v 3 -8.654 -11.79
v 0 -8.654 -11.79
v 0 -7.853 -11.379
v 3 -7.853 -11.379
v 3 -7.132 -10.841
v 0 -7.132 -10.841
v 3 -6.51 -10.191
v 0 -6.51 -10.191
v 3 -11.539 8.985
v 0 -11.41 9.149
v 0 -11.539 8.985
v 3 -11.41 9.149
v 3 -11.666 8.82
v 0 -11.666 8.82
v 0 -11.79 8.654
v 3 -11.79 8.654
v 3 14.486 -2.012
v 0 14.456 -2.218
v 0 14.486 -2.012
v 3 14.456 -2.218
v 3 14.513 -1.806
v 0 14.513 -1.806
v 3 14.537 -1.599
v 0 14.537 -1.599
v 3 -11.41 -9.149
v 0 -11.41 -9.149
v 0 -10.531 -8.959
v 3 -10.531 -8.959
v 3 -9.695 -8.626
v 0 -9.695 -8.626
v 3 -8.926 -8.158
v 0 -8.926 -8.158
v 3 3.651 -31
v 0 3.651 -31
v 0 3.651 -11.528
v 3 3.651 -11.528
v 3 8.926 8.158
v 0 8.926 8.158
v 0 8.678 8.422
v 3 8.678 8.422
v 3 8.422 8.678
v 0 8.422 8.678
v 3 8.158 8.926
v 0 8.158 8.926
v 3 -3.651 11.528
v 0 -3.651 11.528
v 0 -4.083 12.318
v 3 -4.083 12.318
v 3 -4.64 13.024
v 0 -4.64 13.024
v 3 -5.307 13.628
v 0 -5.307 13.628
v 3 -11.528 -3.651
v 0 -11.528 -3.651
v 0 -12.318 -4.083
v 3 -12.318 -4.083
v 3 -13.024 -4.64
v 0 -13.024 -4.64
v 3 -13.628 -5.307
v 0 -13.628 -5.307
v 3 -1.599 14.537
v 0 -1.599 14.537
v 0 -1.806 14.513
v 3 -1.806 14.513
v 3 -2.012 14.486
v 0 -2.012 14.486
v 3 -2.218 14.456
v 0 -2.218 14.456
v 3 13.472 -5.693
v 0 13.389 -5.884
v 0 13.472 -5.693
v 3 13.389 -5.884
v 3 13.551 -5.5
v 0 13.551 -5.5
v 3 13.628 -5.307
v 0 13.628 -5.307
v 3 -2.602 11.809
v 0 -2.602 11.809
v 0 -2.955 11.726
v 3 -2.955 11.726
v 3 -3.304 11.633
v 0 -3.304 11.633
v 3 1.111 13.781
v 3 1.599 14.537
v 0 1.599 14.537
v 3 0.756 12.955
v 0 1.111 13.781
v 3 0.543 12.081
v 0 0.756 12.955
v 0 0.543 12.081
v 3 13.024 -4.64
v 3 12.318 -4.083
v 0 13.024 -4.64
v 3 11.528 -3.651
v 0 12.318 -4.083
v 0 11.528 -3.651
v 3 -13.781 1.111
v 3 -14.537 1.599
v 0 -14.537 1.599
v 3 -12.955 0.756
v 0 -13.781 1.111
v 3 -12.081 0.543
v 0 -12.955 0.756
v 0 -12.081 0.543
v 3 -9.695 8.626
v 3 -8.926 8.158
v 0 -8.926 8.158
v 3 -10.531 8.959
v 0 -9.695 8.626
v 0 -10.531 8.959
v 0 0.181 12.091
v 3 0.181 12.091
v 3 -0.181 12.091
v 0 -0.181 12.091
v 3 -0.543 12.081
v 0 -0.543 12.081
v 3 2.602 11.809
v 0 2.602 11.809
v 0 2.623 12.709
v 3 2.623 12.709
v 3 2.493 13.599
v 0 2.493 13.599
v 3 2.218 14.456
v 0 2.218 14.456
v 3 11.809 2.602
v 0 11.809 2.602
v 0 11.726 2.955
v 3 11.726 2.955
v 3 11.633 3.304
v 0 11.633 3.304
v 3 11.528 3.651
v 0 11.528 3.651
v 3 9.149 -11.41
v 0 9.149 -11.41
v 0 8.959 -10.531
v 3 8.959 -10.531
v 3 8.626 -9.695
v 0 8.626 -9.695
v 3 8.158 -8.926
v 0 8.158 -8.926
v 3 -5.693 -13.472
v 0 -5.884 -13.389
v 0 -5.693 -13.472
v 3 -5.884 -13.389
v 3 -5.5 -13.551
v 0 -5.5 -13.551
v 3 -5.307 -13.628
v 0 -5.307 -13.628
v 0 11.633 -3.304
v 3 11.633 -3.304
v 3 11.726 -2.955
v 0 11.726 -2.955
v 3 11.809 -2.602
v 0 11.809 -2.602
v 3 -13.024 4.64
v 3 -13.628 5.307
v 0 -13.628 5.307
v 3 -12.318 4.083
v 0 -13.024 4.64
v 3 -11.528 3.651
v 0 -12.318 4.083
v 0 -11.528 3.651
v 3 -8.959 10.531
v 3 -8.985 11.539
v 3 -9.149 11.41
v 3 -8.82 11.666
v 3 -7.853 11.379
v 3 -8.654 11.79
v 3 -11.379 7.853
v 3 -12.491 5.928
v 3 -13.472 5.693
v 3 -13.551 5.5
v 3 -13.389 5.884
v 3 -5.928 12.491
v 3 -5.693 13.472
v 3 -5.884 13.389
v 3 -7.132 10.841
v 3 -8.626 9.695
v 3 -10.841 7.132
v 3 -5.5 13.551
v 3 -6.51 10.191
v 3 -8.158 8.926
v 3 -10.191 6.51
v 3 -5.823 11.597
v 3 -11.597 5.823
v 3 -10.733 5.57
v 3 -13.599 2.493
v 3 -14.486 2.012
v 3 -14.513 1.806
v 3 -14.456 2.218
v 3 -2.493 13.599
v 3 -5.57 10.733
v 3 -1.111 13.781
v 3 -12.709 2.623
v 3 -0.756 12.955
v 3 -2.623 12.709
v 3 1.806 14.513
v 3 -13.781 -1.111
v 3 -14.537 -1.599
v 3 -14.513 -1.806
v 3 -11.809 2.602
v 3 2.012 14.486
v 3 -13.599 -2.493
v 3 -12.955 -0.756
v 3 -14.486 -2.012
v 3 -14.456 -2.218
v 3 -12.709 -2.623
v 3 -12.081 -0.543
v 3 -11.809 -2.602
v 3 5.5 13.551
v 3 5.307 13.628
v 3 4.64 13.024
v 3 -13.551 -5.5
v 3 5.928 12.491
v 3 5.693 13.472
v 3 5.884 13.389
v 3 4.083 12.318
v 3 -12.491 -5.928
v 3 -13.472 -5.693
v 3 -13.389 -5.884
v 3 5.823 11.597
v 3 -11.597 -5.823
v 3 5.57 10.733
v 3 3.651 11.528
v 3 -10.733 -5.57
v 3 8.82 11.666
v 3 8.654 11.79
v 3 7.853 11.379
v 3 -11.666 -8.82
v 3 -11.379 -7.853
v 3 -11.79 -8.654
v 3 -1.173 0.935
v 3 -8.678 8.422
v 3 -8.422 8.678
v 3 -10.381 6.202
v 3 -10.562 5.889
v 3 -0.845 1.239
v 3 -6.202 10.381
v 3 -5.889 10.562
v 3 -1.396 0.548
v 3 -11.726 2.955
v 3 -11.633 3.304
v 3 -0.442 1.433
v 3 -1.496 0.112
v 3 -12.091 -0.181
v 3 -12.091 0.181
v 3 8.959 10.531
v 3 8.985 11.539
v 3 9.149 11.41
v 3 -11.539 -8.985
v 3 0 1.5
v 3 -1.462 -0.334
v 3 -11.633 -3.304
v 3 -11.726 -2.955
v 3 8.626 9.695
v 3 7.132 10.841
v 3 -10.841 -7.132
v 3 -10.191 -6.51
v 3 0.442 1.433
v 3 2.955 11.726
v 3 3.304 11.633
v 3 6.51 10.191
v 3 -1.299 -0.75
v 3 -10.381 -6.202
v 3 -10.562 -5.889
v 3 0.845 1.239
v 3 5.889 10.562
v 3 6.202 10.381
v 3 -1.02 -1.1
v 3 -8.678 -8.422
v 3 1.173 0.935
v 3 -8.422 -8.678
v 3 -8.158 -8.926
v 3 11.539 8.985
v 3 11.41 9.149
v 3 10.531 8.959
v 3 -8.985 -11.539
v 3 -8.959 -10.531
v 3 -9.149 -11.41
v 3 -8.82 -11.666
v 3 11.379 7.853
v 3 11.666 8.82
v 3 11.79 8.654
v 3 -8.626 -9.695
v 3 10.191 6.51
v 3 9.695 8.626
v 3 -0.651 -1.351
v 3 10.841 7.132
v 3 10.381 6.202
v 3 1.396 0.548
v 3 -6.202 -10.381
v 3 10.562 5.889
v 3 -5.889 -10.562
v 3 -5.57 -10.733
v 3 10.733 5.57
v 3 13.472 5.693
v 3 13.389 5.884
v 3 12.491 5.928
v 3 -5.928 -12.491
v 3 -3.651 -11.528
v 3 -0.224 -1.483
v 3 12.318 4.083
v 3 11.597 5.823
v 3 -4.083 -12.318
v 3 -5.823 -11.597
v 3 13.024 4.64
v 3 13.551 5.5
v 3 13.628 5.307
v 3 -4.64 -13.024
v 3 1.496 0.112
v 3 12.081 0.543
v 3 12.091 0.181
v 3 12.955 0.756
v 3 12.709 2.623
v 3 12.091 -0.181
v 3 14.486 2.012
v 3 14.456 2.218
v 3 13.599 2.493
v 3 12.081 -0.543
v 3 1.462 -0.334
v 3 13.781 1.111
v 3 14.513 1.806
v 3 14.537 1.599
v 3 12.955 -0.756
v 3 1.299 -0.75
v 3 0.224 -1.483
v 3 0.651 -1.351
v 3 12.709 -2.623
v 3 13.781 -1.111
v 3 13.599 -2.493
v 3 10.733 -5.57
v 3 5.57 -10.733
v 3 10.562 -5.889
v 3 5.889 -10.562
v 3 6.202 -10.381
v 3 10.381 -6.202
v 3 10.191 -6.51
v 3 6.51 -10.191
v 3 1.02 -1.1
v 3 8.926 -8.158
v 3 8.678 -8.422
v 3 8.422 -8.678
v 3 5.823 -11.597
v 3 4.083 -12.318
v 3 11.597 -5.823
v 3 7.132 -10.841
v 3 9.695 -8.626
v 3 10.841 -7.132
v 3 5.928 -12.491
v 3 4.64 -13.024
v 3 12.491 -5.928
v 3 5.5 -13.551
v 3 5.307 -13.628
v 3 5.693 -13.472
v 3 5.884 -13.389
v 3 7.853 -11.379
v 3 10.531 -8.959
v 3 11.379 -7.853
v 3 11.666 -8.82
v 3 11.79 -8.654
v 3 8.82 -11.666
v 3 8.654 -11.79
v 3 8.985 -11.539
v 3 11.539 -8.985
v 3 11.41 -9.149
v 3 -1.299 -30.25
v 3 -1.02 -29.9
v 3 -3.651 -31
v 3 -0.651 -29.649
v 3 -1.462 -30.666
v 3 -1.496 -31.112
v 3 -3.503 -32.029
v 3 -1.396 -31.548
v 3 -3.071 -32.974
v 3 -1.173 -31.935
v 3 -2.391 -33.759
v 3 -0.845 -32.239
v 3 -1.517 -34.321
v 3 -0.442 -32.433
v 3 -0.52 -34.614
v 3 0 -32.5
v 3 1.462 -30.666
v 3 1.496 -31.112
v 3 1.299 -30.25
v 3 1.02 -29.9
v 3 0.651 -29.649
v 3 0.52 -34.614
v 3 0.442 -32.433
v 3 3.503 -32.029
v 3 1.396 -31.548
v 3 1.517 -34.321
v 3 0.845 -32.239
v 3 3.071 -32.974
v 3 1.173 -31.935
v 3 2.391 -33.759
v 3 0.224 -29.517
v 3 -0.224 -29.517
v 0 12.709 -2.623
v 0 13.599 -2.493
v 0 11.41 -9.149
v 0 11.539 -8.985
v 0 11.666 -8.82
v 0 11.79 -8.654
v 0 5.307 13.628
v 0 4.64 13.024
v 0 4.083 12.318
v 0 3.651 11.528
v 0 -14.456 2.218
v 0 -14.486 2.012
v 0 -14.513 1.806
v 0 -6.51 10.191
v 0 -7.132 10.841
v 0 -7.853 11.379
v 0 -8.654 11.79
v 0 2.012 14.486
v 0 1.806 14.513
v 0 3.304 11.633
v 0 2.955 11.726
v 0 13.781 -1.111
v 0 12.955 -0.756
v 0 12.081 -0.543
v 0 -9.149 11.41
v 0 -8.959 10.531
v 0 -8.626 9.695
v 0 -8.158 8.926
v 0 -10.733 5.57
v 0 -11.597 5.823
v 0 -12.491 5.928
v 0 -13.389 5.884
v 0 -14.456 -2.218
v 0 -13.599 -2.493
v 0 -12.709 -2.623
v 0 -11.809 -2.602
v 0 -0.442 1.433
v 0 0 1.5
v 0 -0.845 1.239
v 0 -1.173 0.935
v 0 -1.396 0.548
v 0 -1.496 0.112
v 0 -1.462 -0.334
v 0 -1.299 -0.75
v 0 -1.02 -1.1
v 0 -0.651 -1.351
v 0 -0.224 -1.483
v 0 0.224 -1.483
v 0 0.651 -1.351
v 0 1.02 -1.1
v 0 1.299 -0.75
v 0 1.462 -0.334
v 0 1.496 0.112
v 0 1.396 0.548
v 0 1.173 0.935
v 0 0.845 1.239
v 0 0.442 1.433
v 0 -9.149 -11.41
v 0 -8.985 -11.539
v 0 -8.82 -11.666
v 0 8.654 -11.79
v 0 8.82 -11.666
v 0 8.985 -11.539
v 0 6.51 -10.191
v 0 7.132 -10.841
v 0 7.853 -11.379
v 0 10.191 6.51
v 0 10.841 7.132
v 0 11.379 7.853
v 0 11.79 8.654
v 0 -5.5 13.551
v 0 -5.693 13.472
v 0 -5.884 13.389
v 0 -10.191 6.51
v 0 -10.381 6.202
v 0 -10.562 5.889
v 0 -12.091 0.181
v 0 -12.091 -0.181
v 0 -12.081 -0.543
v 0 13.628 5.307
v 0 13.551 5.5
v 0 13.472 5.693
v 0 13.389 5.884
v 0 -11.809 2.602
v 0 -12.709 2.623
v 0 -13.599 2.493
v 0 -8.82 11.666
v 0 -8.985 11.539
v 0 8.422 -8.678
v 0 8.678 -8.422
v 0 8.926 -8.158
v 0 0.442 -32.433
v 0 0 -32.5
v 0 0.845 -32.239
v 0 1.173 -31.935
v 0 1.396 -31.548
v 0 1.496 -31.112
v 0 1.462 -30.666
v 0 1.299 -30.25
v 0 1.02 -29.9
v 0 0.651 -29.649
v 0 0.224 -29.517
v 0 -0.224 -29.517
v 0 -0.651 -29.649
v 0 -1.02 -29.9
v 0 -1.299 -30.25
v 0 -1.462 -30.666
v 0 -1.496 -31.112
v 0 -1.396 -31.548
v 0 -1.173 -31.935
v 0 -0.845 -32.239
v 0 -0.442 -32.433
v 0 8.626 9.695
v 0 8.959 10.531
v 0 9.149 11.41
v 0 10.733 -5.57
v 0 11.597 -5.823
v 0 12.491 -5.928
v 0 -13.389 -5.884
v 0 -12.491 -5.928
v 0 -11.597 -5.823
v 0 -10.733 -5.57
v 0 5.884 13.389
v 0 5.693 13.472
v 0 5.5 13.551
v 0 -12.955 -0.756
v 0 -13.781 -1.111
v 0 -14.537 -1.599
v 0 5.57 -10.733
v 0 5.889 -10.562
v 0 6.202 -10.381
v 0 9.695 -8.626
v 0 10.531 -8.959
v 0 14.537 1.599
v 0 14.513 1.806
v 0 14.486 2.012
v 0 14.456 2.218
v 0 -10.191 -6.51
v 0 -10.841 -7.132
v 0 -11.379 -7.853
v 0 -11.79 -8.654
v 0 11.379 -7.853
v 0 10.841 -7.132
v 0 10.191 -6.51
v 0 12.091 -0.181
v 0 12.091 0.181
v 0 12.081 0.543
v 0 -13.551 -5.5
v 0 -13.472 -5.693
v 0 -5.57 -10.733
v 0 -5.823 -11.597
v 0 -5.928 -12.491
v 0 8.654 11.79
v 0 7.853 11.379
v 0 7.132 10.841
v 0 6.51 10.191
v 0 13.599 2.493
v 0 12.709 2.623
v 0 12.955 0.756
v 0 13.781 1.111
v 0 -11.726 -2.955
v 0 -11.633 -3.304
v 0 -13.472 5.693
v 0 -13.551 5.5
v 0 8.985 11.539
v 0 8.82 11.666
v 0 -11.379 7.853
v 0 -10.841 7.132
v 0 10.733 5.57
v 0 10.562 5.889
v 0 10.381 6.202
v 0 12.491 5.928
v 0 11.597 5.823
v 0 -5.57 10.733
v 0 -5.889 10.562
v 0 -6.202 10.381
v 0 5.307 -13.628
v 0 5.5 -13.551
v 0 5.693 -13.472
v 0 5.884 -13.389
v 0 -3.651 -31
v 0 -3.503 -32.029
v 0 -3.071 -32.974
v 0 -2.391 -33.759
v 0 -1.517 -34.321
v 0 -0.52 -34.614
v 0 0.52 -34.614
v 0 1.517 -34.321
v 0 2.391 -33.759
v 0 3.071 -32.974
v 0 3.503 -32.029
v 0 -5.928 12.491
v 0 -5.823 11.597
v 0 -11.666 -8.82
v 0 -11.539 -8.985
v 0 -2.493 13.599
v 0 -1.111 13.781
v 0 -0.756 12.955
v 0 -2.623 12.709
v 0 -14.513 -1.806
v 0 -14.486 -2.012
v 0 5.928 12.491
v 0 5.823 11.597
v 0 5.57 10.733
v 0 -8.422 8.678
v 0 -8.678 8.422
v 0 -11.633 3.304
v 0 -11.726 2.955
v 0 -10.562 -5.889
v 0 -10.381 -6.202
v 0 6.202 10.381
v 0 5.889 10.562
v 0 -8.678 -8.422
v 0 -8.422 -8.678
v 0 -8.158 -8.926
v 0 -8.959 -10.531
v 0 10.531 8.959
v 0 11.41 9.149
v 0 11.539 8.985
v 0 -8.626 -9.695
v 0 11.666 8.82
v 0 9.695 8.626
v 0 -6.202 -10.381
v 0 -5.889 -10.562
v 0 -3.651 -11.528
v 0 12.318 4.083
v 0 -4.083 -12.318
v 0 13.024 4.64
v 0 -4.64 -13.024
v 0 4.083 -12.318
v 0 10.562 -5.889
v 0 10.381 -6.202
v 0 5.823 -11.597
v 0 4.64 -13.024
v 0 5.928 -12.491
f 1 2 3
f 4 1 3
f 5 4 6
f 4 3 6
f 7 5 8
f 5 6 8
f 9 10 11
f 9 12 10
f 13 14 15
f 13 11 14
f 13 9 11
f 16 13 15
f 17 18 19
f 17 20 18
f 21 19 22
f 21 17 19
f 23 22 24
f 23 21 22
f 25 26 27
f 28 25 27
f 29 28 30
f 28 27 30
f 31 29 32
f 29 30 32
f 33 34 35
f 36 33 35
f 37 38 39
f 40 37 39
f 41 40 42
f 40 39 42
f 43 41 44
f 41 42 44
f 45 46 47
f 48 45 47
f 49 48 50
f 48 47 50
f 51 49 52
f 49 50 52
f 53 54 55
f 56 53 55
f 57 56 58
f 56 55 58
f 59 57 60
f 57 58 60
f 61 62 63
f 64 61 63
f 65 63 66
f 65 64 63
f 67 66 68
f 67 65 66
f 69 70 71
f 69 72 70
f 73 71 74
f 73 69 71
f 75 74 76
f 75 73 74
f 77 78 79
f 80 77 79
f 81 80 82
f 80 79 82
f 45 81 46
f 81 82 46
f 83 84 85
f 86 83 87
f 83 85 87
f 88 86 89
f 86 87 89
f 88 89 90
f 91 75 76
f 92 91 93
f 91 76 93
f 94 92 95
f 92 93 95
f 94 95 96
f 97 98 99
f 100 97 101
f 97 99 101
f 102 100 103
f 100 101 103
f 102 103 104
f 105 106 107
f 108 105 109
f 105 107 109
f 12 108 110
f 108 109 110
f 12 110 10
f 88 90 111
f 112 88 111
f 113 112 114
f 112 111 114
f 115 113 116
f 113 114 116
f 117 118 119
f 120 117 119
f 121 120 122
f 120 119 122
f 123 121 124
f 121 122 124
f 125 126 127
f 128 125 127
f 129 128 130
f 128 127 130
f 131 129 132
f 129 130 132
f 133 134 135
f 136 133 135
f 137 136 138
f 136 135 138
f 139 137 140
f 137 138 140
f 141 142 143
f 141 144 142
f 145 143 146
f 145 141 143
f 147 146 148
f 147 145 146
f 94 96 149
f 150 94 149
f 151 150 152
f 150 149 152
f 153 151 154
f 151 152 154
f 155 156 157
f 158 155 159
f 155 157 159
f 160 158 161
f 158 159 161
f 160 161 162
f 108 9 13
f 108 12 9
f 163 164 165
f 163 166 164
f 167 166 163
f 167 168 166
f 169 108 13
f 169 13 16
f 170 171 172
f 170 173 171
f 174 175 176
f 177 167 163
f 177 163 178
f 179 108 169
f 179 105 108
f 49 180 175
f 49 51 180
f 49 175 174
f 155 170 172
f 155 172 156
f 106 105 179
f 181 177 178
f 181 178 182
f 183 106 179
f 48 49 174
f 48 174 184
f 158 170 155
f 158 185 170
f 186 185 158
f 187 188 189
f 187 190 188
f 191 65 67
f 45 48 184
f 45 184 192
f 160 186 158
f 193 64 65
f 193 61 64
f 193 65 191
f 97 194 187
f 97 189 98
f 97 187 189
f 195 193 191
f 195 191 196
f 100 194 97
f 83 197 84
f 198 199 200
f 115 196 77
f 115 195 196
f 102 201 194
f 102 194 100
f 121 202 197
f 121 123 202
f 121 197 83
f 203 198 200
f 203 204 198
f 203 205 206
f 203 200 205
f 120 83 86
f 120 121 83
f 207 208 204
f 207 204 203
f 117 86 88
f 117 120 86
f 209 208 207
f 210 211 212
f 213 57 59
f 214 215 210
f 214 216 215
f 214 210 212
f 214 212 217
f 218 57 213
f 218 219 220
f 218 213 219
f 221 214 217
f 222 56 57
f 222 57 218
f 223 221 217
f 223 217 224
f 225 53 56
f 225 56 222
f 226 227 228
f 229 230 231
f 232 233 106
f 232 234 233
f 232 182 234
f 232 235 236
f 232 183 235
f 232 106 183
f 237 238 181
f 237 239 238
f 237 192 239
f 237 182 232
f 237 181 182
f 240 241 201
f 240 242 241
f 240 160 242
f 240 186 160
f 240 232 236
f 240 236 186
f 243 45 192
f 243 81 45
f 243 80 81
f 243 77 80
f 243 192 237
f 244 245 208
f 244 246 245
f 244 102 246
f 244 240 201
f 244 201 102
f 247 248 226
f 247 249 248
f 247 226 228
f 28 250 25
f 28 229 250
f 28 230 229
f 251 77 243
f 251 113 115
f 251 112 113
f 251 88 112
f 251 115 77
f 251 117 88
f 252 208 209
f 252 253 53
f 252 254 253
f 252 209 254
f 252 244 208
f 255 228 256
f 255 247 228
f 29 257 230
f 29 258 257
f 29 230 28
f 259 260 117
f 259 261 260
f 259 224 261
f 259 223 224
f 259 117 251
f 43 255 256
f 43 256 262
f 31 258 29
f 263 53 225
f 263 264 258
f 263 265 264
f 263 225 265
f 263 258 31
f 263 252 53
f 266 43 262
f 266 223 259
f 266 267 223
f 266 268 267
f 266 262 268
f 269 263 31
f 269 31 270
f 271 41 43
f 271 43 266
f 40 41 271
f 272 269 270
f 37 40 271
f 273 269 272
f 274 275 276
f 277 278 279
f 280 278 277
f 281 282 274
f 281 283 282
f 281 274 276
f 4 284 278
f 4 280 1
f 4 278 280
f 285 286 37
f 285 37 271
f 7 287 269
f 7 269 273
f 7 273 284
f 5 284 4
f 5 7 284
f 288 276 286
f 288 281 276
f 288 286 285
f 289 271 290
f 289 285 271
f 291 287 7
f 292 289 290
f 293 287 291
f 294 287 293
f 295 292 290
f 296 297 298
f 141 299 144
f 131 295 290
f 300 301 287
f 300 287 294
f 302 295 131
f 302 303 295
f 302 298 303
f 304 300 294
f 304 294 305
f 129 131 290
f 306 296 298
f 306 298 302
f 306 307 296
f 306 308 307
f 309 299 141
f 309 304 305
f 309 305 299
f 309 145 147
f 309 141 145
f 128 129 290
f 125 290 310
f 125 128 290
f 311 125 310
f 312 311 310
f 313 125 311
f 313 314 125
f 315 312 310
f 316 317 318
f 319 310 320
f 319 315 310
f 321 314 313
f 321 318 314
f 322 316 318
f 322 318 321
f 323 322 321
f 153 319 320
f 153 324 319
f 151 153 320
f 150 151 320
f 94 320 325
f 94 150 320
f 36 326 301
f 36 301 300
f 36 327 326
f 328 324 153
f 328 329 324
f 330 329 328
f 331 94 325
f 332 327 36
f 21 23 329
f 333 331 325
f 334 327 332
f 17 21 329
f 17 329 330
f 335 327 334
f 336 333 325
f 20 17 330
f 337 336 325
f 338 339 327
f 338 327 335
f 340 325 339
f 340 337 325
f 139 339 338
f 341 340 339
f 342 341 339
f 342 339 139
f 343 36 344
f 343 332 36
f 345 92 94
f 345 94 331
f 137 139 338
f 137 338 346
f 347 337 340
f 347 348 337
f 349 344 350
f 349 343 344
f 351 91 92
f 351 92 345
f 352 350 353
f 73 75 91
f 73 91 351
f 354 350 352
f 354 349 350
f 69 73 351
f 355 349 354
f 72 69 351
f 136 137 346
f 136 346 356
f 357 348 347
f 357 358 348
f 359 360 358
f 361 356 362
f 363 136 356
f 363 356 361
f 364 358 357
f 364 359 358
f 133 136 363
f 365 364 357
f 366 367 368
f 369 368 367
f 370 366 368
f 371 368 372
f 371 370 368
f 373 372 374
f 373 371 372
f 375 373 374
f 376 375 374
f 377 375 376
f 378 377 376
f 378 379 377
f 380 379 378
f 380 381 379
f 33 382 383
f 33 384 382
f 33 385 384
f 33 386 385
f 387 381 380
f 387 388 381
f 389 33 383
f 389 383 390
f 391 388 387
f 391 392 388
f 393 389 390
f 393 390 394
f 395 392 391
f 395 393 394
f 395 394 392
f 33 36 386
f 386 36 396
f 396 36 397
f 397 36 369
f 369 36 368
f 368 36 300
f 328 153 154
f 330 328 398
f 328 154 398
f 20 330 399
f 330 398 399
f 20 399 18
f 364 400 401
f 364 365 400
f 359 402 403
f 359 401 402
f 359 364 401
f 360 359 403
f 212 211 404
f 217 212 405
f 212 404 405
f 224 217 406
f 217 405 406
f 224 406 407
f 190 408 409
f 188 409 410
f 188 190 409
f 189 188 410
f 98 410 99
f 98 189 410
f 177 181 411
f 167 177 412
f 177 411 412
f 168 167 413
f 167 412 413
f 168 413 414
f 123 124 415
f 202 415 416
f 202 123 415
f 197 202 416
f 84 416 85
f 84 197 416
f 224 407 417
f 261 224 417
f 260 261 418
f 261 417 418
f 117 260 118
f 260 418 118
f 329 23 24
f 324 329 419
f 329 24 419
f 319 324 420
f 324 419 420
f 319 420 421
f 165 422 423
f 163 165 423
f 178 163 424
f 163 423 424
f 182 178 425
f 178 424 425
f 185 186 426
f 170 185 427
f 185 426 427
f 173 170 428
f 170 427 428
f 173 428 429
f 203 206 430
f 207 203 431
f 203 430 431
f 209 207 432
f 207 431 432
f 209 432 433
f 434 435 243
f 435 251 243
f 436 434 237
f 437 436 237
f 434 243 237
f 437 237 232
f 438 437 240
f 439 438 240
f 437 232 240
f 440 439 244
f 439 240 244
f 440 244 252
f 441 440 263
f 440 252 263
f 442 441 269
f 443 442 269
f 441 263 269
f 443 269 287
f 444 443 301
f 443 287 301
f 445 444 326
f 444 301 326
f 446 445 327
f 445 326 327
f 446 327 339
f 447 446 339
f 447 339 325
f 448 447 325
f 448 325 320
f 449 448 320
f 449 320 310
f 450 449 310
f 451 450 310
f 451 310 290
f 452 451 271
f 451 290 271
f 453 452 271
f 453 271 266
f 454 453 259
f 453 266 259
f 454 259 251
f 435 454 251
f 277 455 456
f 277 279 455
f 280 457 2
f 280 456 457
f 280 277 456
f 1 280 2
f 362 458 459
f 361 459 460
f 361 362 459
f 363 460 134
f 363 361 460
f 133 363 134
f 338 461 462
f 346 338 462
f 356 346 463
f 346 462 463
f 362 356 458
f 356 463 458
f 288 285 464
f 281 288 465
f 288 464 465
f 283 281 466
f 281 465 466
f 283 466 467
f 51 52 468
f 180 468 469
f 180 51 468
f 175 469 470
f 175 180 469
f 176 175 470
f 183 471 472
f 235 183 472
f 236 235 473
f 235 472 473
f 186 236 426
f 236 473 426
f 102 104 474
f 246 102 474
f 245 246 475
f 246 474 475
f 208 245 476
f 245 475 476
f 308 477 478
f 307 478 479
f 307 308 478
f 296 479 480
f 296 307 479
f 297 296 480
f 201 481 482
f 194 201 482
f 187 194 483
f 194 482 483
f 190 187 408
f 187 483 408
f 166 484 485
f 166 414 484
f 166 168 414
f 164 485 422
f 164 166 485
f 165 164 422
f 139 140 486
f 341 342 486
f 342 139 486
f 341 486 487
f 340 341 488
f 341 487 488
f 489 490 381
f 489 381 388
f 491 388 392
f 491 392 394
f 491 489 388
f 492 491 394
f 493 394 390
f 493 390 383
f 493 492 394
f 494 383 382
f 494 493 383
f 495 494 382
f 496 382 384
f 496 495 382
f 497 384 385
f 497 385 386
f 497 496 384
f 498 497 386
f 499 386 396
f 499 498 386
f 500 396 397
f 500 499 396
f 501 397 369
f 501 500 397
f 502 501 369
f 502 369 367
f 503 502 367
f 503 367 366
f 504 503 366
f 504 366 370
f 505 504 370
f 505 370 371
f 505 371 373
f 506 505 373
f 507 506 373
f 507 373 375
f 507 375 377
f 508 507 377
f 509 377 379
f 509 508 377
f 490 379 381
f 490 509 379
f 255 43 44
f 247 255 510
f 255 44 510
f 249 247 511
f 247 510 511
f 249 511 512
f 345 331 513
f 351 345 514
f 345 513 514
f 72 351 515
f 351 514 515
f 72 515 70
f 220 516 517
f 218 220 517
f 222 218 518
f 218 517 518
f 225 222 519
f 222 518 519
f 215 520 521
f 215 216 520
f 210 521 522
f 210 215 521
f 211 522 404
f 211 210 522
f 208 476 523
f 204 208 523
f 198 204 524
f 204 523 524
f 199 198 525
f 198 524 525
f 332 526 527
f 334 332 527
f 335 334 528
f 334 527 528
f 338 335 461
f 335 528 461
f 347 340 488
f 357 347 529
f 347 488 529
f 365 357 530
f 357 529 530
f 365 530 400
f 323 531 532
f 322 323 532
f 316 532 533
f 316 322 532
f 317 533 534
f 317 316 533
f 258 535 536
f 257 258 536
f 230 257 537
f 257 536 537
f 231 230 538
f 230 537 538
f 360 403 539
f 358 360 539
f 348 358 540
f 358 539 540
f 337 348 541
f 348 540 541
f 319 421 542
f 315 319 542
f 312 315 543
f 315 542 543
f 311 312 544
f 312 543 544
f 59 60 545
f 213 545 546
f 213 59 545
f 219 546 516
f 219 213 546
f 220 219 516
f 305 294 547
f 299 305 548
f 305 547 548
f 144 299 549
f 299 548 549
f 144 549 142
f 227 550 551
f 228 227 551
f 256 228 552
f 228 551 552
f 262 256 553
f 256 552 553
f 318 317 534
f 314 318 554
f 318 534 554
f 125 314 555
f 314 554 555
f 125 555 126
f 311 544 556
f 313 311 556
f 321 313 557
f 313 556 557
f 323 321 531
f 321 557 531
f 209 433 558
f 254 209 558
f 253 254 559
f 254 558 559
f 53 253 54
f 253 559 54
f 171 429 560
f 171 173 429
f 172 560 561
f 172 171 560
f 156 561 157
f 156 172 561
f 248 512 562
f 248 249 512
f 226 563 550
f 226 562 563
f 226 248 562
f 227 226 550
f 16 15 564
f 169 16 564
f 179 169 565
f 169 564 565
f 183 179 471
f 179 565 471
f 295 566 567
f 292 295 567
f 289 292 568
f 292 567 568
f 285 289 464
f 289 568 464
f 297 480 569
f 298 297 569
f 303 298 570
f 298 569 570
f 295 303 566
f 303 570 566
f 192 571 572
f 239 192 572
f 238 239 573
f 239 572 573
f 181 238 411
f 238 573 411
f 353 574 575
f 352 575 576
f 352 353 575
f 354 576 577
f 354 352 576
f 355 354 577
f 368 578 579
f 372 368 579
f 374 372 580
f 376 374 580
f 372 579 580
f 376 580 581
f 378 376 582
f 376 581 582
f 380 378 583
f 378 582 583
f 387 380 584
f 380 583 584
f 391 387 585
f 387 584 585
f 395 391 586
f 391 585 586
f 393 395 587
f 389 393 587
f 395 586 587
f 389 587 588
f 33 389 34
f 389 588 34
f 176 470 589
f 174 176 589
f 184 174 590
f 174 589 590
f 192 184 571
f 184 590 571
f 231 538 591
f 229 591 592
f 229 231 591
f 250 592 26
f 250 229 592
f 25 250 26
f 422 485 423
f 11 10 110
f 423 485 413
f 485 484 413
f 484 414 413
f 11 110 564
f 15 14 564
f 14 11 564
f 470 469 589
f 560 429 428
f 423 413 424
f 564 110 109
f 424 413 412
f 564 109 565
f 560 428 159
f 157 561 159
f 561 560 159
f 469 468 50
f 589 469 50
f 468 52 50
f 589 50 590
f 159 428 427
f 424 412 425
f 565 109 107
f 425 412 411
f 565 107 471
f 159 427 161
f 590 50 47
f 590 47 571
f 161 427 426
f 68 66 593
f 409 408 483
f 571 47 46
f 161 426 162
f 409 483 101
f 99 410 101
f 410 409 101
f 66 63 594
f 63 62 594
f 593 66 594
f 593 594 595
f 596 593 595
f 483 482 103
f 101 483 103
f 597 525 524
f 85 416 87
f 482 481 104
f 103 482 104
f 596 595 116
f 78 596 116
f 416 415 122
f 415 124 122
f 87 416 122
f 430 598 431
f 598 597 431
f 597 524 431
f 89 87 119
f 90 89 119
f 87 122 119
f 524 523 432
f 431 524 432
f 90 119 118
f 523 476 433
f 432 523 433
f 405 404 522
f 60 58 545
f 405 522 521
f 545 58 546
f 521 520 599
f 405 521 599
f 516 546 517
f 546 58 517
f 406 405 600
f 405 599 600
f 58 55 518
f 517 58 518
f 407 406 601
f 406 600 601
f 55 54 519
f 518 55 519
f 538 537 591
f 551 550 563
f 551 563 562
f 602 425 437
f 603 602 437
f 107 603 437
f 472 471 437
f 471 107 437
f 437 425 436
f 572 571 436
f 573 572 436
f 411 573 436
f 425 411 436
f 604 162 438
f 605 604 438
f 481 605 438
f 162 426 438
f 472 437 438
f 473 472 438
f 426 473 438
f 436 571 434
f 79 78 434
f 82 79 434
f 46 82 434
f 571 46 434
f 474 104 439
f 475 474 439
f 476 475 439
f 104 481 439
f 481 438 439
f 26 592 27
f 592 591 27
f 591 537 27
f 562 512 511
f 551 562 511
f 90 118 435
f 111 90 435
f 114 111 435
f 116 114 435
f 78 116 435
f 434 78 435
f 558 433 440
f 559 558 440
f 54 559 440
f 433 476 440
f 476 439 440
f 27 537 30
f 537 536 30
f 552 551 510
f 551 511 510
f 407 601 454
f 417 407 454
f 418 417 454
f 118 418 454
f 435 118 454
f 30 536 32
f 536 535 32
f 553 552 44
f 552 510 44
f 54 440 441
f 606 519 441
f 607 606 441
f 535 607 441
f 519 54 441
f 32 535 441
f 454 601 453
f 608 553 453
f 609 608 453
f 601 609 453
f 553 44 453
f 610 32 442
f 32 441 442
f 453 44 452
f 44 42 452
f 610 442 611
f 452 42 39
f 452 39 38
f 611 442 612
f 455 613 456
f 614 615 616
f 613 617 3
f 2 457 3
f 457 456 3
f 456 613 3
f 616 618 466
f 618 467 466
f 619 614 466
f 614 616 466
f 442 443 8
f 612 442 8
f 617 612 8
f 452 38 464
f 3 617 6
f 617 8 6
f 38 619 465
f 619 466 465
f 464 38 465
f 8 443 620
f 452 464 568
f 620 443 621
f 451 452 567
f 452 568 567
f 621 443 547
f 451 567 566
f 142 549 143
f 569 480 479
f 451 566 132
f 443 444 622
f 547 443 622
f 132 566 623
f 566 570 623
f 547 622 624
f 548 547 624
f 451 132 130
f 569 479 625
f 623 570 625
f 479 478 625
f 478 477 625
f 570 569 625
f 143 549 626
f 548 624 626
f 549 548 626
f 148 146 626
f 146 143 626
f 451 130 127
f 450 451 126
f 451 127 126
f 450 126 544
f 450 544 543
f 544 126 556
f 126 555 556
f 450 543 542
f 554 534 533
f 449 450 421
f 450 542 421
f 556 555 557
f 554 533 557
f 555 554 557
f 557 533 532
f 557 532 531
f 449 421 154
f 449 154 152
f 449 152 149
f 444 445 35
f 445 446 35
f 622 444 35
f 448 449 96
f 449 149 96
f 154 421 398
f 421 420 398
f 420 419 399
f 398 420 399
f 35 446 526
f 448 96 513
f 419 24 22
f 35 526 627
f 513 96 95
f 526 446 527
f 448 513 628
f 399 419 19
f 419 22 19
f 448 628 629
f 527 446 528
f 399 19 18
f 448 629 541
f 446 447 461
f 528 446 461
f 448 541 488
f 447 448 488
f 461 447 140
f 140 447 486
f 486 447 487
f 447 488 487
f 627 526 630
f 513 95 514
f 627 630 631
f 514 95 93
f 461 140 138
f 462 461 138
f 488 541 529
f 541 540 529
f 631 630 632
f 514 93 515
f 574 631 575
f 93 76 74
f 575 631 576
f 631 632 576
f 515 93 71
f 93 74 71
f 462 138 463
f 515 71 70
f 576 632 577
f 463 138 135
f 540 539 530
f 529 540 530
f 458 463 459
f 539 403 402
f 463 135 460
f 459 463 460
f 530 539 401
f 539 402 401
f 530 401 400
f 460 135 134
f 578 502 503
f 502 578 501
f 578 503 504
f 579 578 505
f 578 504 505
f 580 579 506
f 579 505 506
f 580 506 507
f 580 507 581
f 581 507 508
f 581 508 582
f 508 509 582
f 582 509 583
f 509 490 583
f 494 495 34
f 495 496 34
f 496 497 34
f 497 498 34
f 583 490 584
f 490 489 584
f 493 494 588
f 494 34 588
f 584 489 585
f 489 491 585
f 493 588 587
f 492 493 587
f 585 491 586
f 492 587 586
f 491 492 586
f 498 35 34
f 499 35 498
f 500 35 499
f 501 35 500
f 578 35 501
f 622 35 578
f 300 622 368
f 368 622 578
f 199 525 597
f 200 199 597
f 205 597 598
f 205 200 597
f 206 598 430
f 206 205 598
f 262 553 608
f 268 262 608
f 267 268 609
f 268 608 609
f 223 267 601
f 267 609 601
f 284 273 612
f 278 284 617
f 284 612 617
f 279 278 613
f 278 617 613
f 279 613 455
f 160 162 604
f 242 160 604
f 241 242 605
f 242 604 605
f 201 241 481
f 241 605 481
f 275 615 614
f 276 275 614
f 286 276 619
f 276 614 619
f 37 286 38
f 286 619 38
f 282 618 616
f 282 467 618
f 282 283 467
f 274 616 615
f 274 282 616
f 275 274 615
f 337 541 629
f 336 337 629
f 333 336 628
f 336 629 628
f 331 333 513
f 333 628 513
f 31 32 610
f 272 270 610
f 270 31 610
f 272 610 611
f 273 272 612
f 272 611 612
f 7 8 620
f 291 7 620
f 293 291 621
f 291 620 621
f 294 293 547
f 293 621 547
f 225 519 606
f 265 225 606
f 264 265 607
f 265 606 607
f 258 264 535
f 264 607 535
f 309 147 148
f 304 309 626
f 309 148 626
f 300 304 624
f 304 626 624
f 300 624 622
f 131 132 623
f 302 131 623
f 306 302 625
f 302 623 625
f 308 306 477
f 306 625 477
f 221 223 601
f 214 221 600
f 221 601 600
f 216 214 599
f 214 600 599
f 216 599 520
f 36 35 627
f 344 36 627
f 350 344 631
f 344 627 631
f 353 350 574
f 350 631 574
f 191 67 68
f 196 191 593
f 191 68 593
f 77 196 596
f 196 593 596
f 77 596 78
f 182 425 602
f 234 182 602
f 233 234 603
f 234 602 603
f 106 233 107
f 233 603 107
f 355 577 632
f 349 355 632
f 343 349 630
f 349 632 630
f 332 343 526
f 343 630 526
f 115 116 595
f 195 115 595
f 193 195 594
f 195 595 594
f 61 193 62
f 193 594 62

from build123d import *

# Parameters (mm, degrees)
BASPROSKE_W         = 3
BASPROSKE_H         = 14.625
TOOTHCUT_DEPTH      = 21.89931219
TEETHCUTS_COUNT     = 24
TEETHCUTS_ANGLE     = 345
BORSKE_R            = 1.5
BORE_DEPTH          = 50.0000508
SKETCH1_R           = 1.5
BOSS_EXTRUDE1_DEPTH = 3


with BuildPart() as part:
    # BasProSke → Base-Revolve (revolve)
    with BuildSketch(Plane(origin=(0, 0, 0), x_dir=(1, 0, 0), z_dir=(0, 1, 0)), mode=Mode.PRIVATE) as base_revolve_sk:
        with Locations((1.5, 7.3125)):
            Rectangle(BASPROSKE_W, BASPROSKE_H)
    revolve(base_revolve_sk.sketch.rotate(Axis((-10, 0, 0), (1, 0, 0)), 180), axis=Axis((-10, 0, 0), (1, 0, 0)))

    # TooCutSke → ToothCut (cut, through all)
    with BuildSketch(Plane(origin=(0, 0, 0), x_dir=(0, 0, -1), z_dir=(1, 0, 0))):
        with BuildLine():
            ThreePointArc((0.542722358, 12.080565177), (0, 12.09275), (-0.542722358, 12.080565177))
            ThreePointArc((-0.542722358, 12.080565177), (-0.922320579, 13.38903626), (-1.617327261, 14.56085412))
            ThreePointArc((-1.617327261, 14.56085412), (0, 14.6504), (1.617327261, 14.56085412))
            ThreePointArc((1.617327261, 14.56085412), (0.922320579, 13.38903626), (0.542722358, 12.080565177))
        make_face()
    toothcut = extrude(amount=TOOTHCUT_DEPTH, mode=Mode.SUBTRACT)

    # TeethCuts: ToothCut ×24 about axis
    teethcuts_axis = Axis((-10, 0, 0), (1, 0, 0))
    for i in range(1, TEETHCUTS_COUNT):
        add(toothcut.rotate(teethcuts_axis, i * TEETHCUTS_ANGLE / (TEETHCUTS_COUNT - 1)), mode=Mode.SUBTRACT)

    # BorSke → Bore (cut, symmetric)
    with BuildSketch(Plane(origin=(0, 0, 0), x_dir=(0, 0, -1), z_dir=(1, 0, 0))):
        with Locations(Location((0, 0, 0), (0, 0, 180))):
            Circle(BORSKE_R)
    extrude(amount=BORE_DEPTH, both=True, mode=Mode.SUBTRACT)

    # Sketch1 → Boss-Extrude1 (add)
    with BuildSketch(Plane(origin=(0, 0, 0), x_dir=(0, 0, -1), z_dir=(1, 0, 0))):
        with BuildLine():
            Line((31, 3.650909885), (11.528463019, 3.650909885))
            Line((11.528463019, 3.650909885), (11.528463019, -3.650909885))
            Line((11.528463019, -3.650909885), (31, -3.650909885))
            ThreePointArc((31, -3.650909885), (34.650909885, 0), (31, 3.650909885))
        make_face()
        with Locations((31, 0)):
            Circle(SKETCH1_R, mode=Mode.SUBTRACT)
    extrude(amount=BOSS_EXTRUDE1_DEPTH)


solid = part.part
